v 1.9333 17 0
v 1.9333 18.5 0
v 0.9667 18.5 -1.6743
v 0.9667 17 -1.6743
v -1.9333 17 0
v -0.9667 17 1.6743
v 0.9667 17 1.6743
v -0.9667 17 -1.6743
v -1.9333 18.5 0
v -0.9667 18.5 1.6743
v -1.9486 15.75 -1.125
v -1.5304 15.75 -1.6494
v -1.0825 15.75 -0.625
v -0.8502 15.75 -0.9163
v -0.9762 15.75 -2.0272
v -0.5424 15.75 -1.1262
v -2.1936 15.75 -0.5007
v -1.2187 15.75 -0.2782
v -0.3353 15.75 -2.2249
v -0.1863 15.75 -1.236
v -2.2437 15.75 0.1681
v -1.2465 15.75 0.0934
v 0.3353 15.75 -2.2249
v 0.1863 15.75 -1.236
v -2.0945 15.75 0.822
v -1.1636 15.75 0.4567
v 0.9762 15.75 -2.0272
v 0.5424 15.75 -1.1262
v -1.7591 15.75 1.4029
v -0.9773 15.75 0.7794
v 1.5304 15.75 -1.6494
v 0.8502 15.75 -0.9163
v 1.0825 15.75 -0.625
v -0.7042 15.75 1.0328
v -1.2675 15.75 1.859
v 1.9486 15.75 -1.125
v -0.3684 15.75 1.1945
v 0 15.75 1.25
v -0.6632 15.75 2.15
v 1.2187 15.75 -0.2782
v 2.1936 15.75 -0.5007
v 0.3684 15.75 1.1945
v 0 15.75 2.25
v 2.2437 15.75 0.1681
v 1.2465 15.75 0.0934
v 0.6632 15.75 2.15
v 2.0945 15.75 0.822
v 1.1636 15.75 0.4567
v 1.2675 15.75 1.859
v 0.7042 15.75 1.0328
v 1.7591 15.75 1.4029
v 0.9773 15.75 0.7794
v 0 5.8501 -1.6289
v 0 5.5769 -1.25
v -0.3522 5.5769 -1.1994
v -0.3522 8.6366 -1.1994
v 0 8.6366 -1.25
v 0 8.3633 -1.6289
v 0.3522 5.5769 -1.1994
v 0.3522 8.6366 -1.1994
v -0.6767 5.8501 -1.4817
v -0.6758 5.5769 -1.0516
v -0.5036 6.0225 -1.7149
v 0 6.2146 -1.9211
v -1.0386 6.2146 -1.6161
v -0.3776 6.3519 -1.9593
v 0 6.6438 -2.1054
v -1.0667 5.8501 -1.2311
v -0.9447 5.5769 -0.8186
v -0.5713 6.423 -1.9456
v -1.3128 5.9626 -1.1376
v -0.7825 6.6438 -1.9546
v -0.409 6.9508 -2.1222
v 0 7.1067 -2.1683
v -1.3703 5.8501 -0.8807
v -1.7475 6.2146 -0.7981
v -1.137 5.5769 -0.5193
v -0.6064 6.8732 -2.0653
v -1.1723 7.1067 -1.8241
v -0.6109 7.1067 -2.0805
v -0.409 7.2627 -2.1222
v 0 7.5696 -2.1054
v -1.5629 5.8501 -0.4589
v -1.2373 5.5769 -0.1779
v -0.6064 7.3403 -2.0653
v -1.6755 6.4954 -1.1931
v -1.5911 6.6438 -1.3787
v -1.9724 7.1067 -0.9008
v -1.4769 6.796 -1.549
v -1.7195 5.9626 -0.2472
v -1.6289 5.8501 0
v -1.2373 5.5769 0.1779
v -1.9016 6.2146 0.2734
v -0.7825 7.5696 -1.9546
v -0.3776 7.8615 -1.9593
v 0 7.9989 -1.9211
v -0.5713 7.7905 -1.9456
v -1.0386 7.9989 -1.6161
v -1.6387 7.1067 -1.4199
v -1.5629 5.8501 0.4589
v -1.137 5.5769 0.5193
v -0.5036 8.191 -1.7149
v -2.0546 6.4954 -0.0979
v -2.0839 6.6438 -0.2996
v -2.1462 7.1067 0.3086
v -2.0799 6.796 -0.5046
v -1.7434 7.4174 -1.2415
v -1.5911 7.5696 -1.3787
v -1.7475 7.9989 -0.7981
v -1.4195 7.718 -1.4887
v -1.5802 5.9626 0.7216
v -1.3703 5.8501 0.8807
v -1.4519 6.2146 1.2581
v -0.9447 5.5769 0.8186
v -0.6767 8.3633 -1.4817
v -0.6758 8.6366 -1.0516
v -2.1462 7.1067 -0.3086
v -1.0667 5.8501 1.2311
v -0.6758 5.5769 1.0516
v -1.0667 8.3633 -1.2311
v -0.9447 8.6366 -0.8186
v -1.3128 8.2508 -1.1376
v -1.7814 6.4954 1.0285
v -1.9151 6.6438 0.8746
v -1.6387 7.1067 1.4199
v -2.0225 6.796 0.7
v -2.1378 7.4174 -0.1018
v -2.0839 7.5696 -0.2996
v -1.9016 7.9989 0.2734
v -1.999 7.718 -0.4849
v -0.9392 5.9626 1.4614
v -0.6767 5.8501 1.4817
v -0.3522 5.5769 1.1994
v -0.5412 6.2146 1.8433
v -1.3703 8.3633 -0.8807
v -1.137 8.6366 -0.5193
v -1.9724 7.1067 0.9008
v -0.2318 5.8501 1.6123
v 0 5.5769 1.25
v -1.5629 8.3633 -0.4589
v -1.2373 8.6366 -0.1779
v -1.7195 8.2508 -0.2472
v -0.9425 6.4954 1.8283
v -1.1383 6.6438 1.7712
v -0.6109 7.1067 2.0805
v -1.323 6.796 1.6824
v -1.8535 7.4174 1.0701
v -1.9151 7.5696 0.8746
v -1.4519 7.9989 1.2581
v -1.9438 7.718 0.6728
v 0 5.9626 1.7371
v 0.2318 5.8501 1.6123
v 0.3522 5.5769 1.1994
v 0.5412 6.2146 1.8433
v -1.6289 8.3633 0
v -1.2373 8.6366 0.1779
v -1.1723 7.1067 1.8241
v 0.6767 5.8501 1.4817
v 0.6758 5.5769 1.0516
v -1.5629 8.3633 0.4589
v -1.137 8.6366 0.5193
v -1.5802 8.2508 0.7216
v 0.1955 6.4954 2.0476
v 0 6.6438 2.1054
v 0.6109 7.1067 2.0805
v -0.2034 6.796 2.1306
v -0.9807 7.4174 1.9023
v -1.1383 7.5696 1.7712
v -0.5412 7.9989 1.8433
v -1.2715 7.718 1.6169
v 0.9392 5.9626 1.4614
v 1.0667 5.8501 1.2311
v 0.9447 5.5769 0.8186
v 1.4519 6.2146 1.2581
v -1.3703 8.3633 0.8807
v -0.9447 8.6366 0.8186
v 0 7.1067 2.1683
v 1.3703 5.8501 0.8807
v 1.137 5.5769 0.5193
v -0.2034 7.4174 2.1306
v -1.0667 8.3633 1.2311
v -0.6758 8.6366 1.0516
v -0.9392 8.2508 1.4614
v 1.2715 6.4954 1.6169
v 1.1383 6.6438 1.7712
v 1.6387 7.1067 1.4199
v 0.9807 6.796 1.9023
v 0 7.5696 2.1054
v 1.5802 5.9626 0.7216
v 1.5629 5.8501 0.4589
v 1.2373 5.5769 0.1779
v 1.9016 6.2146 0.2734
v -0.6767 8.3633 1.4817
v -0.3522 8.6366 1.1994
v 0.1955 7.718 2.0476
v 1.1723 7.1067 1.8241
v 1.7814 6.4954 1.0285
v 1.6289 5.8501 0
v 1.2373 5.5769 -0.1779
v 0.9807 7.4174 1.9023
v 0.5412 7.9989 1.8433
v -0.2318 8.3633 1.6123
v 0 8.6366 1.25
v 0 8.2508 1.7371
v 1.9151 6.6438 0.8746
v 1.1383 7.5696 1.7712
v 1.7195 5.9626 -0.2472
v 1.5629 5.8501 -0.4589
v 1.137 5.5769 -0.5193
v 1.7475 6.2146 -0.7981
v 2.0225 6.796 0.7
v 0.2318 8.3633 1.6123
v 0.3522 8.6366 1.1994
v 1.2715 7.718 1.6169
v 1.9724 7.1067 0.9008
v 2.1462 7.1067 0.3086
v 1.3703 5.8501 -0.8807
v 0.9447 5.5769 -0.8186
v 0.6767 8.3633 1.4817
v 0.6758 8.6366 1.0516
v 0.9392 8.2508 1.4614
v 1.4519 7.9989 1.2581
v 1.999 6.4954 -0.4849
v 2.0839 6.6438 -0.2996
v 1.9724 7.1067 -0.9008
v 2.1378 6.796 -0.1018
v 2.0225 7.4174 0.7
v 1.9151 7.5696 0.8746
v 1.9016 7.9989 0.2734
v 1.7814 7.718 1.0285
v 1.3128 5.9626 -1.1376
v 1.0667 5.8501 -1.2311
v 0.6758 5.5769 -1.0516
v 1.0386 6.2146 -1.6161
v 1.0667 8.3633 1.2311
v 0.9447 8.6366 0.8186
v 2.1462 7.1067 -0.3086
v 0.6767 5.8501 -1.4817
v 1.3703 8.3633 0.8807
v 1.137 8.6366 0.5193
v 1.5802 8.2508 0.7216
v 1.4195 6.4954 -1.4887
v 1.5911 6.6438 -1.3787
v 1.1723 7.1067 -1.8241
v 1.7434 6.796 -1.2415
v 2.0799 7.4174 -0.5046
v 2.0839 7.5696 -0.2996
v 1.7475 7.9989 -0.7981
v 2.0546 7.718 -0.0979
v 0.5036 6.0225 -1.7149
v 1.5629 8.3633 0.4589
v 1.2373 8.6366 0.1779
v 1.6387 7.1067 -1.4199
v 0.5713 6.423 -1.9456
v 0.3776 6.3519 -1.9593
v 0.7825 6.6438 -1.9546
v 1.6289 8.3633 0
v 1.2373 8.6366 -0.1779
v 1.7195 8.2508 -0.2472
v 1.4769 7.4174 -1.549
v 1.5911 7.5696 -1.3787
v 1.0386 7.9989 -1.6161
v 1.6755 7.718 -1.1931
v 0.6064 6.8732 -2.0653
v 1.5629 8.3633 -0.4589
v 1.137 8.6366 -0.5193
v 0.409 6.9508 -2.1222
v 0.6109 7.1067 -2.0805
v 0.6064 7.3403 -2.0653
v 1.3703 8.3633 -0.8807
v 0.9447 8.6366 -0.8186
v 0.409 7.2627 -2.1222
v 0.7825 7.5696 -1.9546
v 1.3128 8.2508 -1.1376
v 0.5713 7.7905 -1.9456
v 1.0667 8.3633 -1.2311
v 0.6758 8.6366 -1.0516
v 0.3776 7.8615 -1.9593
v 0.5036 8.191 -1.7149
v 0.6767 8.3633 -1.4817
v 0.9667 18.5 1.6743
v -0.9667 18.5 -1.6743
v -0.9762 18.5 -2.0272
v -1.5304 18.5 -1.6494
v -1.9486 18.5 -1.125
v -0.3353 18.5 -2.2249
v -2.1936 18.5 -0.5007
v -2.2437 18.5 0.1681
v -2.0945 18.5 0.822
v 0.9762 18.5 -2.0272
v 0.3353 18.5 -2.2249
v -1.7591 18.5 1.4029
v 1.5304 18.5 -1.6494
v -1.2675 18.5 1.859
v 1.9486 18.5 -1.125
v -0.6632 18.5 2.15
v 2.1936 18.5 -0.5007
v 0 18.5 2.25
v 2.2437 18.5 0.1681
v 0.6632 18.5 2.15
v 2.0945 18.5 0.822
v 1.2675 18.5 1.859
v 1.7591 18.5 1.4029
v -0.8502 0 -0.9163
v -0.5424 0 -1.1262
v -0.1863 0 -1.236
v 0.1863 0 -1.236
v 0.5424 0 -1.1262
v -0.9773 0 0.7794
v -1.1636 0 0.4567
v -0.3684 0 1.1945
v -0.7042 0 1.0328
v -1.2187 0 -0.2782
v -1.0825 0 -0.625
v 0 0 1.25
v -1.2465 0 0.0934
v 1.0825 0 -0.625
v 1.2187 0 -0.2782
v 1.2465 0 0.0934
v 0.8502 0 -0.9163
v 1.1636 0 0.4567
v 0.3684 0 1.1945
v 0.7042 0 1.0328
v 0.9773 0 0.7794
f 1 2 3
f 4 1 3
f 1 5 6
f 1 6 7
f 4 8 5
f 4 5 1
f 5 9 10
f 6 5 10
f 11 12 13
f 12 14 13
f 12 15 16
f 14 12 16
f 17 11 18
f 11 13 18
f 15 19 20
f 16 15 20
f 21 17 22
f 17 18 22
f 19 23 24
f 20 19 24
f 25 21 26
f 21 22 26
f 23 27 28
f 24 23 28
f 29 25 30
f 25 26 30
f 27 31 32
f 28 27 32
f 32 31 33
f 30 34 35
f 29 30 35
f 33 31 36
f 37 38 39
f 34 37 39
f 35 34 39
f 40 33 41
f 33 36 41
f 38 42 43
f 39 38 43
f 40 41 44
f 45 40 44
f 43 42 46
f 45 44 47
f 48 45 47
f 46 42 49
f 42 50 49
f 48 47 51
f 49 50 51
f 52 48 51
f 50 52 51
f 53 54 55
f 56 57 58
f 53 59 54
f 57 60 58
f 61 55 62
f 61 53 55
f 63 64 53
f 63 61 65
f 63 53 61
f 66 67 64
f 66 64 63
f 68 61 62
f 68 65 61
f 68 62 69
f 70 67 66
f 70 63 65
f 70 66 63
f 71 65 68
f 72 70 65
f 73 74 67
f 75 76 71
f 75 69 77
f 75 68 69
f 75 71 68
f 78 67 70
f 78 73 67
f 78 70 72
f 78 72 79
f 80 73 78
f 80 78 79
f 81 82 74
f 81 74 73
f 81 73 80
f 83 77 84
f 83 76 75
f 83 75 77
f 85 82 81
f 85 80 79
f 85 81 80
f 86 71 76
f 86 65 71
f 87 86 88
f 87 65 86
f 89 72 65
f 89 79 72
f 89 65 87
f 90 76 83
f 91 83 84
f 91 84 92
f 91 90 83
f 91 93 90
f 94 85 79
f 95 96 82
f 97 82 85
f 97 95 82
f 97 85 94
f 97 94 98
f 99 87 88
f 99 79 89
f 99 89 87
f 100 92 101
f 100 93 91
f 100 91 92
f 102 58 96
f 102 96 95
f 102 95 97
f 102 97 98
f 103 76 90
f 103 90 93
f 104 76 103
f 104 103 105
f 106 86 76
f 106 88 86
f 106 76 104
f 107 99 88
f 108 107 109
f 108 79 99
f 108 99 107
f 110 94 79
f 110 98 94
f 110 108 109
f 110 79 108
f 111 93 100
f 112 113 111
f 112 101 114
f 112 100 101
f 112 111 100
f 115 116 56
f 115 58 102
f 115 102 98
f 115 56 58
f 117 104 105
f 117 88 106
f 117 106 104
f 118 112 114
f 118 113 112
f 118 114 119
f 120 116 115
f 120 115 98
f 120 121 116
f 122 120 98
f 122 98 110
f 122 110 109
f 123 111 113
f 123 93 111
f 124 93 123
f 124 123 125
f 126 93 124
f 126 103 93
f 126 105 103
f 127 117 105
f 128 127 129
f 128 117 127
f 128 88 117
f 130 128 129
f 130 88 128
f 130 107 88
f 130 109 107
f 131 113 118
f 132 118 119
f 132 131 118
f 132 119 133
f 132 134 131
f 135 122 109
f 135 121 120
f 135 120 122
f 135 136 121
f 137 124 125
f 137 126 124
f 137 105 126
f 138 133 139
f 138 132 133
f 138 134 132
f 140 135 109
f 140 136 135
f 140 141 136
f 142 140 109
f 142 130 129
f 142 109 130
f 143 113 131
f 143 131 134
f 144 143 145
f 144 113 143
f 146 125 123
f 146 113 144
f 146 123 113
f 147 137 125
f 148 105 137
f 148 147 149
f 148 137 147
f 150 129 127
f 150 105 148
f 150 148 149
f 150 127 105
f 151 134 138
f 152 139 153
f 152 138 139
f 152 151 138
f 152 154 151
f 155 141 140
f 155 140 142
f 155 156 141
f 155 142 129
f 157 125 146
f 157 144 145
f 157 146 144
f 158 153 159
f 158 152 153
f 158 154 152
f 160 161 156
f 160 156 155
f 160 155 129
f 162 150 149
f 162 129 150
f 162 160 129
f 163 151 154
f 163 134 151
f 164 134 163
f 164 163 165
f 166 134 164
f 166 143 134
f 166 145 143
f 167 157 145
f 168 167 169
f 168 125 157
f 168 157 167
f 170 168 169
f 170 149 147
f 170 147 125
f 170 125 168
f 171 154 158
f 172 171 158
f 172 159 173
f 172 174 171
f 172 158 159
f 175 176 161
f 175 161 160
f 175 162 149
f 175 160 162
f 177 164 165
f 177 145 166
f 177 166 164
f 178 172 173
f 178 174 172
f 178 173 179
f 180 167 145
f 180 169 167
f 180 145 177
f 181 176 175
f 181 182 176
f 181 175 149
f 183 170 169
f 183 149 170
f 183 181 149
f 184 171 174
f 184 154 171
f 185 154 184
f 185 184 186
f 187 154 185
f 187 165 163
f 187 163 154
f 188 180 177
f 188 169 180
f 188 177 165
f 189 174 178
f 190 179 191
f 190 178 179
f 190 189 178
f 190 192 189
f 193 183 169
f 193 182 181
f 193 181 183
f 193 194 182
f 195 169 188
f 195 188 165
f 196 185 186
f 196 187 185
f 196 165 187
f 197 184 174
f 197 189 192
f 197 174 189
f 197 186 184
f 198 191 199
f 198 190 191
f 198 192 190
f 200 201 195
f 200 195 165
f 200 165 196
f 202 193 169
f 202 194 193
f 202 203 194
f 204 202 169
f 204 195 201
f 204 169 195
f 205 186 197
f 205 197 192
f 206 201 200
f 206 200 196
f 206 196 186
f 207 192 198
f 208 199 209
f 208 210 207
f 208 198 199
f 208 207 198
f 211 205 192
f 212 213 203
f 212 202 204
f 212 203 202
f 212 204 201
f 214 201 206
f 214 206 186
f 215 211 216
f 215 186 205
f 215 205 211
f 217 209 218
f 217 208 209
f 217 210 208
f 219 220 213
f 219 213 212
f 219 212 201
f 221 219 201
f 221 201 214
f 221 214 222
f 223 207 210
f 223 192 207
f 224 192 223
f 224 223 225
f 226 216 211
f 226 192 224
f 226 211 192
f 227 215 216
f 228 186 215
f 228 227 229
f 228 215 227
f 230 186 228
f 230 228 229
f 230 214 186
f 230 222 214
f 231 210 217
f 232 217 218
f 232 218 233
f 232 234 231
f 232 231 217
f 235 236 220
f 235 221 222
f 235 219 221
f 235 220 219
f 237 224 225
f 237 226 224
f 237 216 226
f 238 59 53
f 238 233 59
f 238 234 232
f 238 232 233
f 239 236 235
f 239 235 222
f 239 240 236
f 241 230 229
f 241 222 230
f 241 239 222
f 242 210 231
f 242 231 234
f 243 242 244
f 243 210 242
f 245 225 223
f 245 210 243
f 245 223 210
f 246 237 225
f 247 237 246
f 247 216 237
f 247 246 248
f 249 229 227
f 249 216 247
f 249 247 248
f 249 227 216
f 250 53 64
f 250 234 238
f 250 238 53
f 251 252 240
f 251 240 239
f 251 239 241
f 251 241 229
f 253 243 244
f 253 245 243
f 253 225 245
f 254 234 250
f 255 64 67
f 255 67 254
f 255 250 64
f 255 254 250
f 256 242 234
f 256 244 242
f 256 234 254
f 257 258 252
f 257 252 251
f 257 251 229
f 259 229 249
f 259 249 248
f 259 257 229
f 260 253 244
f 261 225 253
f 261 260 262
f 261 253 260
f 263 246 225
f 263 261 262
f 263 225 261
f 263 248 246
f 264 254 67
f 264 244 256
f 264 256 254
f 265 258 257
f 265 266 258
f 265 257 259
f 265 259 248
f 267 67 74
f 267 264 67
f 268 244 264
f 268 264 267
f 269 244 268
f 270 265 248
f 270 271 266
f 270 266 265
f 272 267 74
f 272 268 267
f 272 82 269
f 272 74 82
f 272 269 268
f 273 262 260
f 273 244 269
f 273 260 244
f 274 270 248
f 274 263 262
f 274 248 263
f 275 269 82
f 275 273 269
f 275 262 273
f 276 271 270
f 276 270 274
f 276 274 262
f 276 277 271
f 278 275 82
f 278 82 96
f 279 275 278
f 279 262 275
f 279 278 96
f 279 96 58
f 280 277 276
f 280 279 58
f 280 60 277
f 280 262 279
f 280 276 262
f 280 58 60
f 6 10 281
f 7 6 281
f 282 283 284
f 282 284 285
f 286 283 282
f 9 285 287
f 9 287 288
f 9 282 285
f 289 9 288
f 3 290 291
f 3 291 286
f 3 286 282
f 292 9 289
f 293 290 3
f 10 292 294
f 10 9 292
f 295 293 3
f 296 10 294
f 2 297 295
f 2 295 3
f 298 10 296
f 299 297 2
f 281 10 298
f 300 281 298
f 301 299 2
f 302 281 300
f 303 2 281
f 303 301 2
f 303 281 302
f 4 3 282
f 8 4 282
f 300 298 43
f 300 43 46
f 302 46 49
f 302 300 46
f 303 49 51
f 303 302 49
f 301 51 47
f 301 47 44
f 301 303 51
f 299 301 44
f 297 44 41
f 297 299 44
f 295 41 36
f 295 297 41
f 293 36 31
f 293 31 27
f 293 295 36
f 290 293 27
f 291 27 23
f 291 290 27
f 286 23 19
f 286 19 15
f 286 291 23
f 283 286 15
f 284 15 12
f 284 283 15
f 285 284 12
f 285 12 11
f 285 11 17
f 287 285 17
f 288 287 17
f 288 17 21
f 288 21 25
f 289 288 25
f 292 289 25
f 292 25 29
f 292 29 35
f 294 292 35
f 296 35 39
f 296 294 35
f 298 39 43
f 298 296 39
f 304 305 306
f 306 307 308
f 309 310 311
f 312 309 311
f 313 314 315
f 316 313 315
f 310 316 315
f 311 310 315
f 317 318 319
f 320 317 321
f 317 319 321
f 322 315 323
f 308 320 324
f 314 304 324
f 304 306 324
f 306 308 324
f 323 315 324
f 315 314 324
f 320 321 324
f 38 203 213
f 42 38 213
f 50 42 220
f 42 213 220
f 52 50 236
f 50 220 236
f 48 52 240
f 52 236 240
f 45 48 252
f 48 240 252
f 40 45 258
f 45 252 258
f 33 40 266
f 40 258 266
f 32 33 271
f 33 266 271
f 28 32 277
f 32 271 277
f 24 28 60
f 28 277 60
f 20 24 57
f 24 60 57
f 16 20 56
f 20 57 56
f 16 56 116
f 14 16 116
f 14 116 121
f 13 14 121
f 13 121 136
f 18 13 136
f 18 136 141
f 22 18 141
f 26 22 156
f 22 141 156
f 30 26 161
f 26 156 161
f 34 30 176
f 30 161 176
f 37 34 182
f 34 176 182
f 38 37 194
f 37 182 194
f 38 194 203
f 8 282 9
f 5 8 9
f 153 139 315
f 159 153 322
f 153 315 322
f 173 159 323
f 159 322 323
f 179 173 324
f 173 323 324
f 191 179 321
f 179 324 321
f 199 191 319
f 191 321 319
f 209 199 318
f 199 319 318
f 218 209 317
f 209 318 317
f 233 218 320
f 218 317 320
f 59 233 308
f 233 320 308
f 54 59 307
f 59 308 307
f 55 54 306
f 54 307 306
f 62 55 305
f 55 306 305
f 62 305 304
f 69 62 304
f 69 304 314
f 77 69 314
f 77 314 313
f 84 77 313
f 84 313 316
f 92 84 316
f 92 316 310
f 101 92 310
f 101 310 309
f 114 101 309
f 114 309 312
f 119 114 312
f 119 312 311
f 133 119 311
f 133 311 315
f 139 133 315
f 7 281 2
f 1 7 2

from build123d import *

# Parameters (mm, degrees)
SKETCH1_R           = 1.25
BOSS_EXTRUDE1_DEPTH = 18.5
SKETCH2_R           = 2.25
BOSS_EXTRUDE2_DEPTH = 2.75
CUT_EXTRUDE1_DEPTH  = 1.5


with BuildPart() as part:
    # Sketch1 → Boss-Extrude1 (new body)
    with BuildSketch(Plane(origin=(0, 0, 0), x_dir=(1, 0, 0), z_dir=(0, 1, 0))):
        with Locations(Location((0, 0, 0), (0, 0, 270))):
            Circle(SKETCH1_R)
    extrude(amount=BOSS_EXTRUDE1_DEPTH)

    # Sketch2 → Boss-Extrude2 (add)
    with BuildSketch(Plane(origin=(0, 18.5, 0), x_dir=(1, 0, 0), z_dir=(0, 1, 0))):
        with Locations(Location((0, 0, 0), (0, 0, 270))):
            Circle(SKETCH2_R)
    extrude(amount=-BOSS_EXTRUDE2_DEPTH)

    # Sketch4 → Revolve1 (revolve)
    with BuildSketch(Plane.XY, mode=Mode.PRIVATE) as revolve1_sk:
        with BuildLine():
            Line((1.25, 8.636562631), (1.25, 5.576897201))
            ThreePointArc((1.25, 5.576897201), (2.168320153, 7.106729916), (1.25, 8.636562631))
        make_face()
    revolve(revolve1_sk.sketch.rotate(Axis((0, 0, 0), (0, 1, 0)), 90), axis=Axis((0, 0, 0), (0, 1, 0)))

    # Sketch5 → Cut-Extrude1 (cut)
    with BuildSketch(Plane(origin=(0, 18.5, 0), x_dir=(1, 0, 0), z_dir=(0, 1, 0))):
        Polygon((0.966659902, 1.674304064), (-0.966659902, 1.674304064), (-1.933319804, 0), (-0.966659902, -1.674304064), (0.966659902, -1.674304064), (1.933319804, 0), align=None)
    extrude(amount=-CUT_EXTRUDE1_DEPTH, mode=Mode.SUBTRACT)


solid = part.part
